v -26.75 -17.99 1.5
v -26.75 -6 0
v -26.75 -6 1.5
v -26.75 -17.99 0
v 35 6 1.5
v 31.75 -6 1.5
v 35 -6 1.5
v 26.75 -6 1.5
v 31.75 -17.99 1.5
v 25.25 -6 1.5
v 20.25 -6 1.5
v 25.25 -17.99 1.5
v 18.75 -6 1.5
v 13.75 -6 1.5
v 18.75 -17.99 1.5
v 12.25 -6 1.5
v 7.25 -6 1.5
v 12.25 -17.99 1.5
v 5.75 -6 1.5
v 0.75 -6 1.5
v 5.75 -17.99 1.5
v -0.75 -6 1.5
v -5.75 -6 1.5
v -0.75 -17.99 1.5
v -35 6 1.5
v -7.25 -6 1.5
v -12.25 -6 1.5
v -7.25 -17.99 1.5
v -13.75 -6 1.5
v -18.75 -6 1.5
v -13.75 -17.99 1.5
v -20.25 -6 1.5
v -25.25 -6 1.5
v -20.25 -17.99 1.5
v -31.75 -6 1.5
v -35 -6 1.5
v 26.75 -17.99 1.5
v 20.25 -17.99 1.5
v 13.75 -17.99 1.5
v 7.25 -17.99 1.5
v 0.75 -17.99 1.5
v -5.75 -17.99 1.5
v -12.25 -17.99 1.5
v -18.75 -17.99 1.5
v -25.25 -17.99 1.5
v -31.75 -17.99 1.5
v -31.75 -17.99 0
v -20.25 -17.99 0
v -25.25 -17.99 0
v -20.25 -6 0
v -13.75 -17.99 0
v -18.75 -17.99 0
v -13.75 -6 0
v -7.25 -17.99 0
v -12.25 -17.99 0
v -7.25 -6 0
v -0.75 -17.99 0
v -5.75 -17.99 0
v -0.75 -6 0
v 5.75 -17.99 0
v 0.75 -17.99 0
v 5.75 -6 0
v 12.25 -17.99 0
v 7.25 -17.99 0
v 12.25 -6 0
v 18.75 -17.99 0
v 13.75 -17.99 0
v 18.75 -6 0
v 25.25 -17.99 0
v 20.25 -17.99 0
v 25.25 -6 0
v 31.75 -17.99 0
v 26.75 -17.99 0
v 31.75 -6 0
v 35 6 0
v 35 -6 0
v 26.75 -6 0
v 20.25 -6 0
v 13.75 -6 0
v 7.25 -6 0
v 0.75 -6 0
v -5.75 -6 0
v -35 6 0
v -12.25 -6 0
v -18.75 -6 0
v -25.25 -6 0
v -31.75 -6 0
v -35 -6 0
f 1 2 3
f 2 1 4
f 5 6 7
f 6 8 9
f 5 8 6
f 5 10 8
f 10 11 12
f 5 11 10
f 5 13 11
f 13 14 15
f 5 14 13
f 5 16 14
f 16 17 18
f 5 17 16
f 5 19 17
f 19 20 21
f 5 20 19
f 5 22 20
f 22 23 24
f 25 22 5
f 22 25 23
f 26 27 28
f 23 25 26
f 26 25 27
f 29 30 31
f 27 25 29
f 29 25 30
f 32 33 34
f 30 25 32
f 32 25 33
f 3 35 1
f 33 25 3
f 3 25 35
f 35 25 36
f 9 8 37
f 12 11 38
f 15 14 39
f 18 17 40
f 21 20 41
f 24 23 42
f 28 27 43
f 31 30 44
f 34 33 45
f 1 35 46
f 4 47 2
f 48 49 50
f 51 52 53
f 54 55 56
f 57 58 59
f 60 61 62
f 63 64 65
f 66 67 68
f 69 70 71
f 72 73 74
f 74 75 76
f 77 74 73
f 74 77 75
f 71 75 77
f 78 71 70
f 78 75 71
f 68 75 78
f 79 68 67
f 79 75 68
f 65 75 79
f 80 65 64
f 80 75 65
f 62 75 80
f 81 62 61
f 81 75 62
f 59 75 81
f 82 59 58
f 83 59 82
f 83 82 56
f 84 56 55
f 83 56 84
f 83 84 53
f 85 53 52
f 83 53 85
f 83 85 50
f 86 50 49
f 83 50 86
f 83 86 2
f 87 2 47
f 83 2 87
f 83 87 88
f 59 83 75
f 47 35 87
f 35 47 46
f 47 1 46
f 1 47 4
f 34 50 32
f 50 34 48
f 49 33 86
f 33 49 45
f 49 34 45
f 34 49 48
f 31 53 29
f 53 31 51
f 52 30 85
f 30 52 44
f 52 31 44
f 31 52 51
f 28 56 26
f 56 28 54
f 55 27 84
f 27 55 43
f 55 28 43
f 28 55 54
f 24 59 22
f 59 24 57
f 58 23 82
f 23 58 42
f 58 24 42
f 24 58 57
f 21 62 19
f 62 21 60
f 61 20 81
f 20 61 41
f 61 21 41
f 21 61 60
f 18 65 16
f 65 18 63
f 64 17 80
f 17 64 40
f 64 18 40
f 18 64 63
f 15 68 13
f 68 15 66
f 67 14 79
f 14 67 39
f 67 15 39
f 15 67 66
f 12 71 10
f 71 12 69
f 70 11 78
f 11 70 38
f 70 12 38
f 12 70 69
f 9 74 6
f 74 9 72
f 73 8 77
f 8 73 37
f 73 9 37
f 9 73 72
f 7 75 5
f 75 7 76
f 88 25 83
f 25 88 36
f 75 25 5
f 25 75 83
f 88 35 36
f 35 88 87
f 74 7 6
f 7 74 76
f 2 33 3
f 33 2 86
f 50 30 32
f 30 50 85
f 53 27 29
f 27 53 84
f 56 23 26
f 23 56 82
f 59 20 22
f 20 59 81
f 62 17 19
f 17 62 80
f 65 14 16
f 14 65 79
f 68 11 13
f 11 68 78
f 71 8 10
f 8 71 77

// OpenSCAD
// 10-Well Agarose Gel Comb
// Designed for FDM printing, lying flat on the XY plane.

// --- Dimensions (mm) ---
spine_length = 70.0;      // X dimension of the spine
spine_width = 12.0;       // Y dimension of the spine
plate_thickness = 1.5;    // Z dimension (height)

num_teeth = 10;           // Number of teeth
tooth_width = 5.0;        // X dimension of each tooth
tooth_length = 12.0;      // Y dimension of each tooth (extending from spine)
gap_width = 1.5;          // Y dimension of the gap between teeth

// --- Derived Calculations ---
// Total width of the teeth/gap array
// Total width = (num_teeth * tooth_width) + ((num_teeth - 1) * gap_width)
total_teeth_array_width = (num_teeth * tooth_width) + ((num_teeth - 1) * gap_width);

// Calculate starting X to center the teeth array on the spine
x_offset = (spine_length - total_teeth_array_width) / 2;

// --- Rendering Settings ---
$fn = 64;

// --- Main Model ---
union() {
    // 1. The Spine (The main plate)
    // Centered on X and Y, resting on Z=0
    translate([-spine_length/2, -spine_width/2, 0])
        cube([spine_length, spine_width, plate_thickness]);

    // 2. The Teeth
    // We iterate through the number of teeth to place them along the -Y edge
    for (i = [0 : num_teeth - 1]) {
        // Calculate X position for this specific tooth
        // Starts at x_offset, then moves by (width + gap) for each tooth
        current_tooth_x = -spine_length/2 + x_offset + (i * (tooth_width + gap_width));
        
        // We use a difference/union approach to ensure teeth are part of the solid.
        // Since teeth hang from the edge, we place them such that they overlap the spine slightly
        // to ensure a manifold solid.
        translate([current_tooth_x, -spine_width/2 - tooth_length + 0.01, 0])
            cube([tooth_width, tooth_length, plate_thickness]);
    }
}

// Note: The teeth are modeled as being attached to the -Y edge of the spine.
// The spine is centered on Y, so its edge is at -spine_width/2.
// The teeth extend from -spine_width/2 down to -spine_width/2 - tooth_length.
